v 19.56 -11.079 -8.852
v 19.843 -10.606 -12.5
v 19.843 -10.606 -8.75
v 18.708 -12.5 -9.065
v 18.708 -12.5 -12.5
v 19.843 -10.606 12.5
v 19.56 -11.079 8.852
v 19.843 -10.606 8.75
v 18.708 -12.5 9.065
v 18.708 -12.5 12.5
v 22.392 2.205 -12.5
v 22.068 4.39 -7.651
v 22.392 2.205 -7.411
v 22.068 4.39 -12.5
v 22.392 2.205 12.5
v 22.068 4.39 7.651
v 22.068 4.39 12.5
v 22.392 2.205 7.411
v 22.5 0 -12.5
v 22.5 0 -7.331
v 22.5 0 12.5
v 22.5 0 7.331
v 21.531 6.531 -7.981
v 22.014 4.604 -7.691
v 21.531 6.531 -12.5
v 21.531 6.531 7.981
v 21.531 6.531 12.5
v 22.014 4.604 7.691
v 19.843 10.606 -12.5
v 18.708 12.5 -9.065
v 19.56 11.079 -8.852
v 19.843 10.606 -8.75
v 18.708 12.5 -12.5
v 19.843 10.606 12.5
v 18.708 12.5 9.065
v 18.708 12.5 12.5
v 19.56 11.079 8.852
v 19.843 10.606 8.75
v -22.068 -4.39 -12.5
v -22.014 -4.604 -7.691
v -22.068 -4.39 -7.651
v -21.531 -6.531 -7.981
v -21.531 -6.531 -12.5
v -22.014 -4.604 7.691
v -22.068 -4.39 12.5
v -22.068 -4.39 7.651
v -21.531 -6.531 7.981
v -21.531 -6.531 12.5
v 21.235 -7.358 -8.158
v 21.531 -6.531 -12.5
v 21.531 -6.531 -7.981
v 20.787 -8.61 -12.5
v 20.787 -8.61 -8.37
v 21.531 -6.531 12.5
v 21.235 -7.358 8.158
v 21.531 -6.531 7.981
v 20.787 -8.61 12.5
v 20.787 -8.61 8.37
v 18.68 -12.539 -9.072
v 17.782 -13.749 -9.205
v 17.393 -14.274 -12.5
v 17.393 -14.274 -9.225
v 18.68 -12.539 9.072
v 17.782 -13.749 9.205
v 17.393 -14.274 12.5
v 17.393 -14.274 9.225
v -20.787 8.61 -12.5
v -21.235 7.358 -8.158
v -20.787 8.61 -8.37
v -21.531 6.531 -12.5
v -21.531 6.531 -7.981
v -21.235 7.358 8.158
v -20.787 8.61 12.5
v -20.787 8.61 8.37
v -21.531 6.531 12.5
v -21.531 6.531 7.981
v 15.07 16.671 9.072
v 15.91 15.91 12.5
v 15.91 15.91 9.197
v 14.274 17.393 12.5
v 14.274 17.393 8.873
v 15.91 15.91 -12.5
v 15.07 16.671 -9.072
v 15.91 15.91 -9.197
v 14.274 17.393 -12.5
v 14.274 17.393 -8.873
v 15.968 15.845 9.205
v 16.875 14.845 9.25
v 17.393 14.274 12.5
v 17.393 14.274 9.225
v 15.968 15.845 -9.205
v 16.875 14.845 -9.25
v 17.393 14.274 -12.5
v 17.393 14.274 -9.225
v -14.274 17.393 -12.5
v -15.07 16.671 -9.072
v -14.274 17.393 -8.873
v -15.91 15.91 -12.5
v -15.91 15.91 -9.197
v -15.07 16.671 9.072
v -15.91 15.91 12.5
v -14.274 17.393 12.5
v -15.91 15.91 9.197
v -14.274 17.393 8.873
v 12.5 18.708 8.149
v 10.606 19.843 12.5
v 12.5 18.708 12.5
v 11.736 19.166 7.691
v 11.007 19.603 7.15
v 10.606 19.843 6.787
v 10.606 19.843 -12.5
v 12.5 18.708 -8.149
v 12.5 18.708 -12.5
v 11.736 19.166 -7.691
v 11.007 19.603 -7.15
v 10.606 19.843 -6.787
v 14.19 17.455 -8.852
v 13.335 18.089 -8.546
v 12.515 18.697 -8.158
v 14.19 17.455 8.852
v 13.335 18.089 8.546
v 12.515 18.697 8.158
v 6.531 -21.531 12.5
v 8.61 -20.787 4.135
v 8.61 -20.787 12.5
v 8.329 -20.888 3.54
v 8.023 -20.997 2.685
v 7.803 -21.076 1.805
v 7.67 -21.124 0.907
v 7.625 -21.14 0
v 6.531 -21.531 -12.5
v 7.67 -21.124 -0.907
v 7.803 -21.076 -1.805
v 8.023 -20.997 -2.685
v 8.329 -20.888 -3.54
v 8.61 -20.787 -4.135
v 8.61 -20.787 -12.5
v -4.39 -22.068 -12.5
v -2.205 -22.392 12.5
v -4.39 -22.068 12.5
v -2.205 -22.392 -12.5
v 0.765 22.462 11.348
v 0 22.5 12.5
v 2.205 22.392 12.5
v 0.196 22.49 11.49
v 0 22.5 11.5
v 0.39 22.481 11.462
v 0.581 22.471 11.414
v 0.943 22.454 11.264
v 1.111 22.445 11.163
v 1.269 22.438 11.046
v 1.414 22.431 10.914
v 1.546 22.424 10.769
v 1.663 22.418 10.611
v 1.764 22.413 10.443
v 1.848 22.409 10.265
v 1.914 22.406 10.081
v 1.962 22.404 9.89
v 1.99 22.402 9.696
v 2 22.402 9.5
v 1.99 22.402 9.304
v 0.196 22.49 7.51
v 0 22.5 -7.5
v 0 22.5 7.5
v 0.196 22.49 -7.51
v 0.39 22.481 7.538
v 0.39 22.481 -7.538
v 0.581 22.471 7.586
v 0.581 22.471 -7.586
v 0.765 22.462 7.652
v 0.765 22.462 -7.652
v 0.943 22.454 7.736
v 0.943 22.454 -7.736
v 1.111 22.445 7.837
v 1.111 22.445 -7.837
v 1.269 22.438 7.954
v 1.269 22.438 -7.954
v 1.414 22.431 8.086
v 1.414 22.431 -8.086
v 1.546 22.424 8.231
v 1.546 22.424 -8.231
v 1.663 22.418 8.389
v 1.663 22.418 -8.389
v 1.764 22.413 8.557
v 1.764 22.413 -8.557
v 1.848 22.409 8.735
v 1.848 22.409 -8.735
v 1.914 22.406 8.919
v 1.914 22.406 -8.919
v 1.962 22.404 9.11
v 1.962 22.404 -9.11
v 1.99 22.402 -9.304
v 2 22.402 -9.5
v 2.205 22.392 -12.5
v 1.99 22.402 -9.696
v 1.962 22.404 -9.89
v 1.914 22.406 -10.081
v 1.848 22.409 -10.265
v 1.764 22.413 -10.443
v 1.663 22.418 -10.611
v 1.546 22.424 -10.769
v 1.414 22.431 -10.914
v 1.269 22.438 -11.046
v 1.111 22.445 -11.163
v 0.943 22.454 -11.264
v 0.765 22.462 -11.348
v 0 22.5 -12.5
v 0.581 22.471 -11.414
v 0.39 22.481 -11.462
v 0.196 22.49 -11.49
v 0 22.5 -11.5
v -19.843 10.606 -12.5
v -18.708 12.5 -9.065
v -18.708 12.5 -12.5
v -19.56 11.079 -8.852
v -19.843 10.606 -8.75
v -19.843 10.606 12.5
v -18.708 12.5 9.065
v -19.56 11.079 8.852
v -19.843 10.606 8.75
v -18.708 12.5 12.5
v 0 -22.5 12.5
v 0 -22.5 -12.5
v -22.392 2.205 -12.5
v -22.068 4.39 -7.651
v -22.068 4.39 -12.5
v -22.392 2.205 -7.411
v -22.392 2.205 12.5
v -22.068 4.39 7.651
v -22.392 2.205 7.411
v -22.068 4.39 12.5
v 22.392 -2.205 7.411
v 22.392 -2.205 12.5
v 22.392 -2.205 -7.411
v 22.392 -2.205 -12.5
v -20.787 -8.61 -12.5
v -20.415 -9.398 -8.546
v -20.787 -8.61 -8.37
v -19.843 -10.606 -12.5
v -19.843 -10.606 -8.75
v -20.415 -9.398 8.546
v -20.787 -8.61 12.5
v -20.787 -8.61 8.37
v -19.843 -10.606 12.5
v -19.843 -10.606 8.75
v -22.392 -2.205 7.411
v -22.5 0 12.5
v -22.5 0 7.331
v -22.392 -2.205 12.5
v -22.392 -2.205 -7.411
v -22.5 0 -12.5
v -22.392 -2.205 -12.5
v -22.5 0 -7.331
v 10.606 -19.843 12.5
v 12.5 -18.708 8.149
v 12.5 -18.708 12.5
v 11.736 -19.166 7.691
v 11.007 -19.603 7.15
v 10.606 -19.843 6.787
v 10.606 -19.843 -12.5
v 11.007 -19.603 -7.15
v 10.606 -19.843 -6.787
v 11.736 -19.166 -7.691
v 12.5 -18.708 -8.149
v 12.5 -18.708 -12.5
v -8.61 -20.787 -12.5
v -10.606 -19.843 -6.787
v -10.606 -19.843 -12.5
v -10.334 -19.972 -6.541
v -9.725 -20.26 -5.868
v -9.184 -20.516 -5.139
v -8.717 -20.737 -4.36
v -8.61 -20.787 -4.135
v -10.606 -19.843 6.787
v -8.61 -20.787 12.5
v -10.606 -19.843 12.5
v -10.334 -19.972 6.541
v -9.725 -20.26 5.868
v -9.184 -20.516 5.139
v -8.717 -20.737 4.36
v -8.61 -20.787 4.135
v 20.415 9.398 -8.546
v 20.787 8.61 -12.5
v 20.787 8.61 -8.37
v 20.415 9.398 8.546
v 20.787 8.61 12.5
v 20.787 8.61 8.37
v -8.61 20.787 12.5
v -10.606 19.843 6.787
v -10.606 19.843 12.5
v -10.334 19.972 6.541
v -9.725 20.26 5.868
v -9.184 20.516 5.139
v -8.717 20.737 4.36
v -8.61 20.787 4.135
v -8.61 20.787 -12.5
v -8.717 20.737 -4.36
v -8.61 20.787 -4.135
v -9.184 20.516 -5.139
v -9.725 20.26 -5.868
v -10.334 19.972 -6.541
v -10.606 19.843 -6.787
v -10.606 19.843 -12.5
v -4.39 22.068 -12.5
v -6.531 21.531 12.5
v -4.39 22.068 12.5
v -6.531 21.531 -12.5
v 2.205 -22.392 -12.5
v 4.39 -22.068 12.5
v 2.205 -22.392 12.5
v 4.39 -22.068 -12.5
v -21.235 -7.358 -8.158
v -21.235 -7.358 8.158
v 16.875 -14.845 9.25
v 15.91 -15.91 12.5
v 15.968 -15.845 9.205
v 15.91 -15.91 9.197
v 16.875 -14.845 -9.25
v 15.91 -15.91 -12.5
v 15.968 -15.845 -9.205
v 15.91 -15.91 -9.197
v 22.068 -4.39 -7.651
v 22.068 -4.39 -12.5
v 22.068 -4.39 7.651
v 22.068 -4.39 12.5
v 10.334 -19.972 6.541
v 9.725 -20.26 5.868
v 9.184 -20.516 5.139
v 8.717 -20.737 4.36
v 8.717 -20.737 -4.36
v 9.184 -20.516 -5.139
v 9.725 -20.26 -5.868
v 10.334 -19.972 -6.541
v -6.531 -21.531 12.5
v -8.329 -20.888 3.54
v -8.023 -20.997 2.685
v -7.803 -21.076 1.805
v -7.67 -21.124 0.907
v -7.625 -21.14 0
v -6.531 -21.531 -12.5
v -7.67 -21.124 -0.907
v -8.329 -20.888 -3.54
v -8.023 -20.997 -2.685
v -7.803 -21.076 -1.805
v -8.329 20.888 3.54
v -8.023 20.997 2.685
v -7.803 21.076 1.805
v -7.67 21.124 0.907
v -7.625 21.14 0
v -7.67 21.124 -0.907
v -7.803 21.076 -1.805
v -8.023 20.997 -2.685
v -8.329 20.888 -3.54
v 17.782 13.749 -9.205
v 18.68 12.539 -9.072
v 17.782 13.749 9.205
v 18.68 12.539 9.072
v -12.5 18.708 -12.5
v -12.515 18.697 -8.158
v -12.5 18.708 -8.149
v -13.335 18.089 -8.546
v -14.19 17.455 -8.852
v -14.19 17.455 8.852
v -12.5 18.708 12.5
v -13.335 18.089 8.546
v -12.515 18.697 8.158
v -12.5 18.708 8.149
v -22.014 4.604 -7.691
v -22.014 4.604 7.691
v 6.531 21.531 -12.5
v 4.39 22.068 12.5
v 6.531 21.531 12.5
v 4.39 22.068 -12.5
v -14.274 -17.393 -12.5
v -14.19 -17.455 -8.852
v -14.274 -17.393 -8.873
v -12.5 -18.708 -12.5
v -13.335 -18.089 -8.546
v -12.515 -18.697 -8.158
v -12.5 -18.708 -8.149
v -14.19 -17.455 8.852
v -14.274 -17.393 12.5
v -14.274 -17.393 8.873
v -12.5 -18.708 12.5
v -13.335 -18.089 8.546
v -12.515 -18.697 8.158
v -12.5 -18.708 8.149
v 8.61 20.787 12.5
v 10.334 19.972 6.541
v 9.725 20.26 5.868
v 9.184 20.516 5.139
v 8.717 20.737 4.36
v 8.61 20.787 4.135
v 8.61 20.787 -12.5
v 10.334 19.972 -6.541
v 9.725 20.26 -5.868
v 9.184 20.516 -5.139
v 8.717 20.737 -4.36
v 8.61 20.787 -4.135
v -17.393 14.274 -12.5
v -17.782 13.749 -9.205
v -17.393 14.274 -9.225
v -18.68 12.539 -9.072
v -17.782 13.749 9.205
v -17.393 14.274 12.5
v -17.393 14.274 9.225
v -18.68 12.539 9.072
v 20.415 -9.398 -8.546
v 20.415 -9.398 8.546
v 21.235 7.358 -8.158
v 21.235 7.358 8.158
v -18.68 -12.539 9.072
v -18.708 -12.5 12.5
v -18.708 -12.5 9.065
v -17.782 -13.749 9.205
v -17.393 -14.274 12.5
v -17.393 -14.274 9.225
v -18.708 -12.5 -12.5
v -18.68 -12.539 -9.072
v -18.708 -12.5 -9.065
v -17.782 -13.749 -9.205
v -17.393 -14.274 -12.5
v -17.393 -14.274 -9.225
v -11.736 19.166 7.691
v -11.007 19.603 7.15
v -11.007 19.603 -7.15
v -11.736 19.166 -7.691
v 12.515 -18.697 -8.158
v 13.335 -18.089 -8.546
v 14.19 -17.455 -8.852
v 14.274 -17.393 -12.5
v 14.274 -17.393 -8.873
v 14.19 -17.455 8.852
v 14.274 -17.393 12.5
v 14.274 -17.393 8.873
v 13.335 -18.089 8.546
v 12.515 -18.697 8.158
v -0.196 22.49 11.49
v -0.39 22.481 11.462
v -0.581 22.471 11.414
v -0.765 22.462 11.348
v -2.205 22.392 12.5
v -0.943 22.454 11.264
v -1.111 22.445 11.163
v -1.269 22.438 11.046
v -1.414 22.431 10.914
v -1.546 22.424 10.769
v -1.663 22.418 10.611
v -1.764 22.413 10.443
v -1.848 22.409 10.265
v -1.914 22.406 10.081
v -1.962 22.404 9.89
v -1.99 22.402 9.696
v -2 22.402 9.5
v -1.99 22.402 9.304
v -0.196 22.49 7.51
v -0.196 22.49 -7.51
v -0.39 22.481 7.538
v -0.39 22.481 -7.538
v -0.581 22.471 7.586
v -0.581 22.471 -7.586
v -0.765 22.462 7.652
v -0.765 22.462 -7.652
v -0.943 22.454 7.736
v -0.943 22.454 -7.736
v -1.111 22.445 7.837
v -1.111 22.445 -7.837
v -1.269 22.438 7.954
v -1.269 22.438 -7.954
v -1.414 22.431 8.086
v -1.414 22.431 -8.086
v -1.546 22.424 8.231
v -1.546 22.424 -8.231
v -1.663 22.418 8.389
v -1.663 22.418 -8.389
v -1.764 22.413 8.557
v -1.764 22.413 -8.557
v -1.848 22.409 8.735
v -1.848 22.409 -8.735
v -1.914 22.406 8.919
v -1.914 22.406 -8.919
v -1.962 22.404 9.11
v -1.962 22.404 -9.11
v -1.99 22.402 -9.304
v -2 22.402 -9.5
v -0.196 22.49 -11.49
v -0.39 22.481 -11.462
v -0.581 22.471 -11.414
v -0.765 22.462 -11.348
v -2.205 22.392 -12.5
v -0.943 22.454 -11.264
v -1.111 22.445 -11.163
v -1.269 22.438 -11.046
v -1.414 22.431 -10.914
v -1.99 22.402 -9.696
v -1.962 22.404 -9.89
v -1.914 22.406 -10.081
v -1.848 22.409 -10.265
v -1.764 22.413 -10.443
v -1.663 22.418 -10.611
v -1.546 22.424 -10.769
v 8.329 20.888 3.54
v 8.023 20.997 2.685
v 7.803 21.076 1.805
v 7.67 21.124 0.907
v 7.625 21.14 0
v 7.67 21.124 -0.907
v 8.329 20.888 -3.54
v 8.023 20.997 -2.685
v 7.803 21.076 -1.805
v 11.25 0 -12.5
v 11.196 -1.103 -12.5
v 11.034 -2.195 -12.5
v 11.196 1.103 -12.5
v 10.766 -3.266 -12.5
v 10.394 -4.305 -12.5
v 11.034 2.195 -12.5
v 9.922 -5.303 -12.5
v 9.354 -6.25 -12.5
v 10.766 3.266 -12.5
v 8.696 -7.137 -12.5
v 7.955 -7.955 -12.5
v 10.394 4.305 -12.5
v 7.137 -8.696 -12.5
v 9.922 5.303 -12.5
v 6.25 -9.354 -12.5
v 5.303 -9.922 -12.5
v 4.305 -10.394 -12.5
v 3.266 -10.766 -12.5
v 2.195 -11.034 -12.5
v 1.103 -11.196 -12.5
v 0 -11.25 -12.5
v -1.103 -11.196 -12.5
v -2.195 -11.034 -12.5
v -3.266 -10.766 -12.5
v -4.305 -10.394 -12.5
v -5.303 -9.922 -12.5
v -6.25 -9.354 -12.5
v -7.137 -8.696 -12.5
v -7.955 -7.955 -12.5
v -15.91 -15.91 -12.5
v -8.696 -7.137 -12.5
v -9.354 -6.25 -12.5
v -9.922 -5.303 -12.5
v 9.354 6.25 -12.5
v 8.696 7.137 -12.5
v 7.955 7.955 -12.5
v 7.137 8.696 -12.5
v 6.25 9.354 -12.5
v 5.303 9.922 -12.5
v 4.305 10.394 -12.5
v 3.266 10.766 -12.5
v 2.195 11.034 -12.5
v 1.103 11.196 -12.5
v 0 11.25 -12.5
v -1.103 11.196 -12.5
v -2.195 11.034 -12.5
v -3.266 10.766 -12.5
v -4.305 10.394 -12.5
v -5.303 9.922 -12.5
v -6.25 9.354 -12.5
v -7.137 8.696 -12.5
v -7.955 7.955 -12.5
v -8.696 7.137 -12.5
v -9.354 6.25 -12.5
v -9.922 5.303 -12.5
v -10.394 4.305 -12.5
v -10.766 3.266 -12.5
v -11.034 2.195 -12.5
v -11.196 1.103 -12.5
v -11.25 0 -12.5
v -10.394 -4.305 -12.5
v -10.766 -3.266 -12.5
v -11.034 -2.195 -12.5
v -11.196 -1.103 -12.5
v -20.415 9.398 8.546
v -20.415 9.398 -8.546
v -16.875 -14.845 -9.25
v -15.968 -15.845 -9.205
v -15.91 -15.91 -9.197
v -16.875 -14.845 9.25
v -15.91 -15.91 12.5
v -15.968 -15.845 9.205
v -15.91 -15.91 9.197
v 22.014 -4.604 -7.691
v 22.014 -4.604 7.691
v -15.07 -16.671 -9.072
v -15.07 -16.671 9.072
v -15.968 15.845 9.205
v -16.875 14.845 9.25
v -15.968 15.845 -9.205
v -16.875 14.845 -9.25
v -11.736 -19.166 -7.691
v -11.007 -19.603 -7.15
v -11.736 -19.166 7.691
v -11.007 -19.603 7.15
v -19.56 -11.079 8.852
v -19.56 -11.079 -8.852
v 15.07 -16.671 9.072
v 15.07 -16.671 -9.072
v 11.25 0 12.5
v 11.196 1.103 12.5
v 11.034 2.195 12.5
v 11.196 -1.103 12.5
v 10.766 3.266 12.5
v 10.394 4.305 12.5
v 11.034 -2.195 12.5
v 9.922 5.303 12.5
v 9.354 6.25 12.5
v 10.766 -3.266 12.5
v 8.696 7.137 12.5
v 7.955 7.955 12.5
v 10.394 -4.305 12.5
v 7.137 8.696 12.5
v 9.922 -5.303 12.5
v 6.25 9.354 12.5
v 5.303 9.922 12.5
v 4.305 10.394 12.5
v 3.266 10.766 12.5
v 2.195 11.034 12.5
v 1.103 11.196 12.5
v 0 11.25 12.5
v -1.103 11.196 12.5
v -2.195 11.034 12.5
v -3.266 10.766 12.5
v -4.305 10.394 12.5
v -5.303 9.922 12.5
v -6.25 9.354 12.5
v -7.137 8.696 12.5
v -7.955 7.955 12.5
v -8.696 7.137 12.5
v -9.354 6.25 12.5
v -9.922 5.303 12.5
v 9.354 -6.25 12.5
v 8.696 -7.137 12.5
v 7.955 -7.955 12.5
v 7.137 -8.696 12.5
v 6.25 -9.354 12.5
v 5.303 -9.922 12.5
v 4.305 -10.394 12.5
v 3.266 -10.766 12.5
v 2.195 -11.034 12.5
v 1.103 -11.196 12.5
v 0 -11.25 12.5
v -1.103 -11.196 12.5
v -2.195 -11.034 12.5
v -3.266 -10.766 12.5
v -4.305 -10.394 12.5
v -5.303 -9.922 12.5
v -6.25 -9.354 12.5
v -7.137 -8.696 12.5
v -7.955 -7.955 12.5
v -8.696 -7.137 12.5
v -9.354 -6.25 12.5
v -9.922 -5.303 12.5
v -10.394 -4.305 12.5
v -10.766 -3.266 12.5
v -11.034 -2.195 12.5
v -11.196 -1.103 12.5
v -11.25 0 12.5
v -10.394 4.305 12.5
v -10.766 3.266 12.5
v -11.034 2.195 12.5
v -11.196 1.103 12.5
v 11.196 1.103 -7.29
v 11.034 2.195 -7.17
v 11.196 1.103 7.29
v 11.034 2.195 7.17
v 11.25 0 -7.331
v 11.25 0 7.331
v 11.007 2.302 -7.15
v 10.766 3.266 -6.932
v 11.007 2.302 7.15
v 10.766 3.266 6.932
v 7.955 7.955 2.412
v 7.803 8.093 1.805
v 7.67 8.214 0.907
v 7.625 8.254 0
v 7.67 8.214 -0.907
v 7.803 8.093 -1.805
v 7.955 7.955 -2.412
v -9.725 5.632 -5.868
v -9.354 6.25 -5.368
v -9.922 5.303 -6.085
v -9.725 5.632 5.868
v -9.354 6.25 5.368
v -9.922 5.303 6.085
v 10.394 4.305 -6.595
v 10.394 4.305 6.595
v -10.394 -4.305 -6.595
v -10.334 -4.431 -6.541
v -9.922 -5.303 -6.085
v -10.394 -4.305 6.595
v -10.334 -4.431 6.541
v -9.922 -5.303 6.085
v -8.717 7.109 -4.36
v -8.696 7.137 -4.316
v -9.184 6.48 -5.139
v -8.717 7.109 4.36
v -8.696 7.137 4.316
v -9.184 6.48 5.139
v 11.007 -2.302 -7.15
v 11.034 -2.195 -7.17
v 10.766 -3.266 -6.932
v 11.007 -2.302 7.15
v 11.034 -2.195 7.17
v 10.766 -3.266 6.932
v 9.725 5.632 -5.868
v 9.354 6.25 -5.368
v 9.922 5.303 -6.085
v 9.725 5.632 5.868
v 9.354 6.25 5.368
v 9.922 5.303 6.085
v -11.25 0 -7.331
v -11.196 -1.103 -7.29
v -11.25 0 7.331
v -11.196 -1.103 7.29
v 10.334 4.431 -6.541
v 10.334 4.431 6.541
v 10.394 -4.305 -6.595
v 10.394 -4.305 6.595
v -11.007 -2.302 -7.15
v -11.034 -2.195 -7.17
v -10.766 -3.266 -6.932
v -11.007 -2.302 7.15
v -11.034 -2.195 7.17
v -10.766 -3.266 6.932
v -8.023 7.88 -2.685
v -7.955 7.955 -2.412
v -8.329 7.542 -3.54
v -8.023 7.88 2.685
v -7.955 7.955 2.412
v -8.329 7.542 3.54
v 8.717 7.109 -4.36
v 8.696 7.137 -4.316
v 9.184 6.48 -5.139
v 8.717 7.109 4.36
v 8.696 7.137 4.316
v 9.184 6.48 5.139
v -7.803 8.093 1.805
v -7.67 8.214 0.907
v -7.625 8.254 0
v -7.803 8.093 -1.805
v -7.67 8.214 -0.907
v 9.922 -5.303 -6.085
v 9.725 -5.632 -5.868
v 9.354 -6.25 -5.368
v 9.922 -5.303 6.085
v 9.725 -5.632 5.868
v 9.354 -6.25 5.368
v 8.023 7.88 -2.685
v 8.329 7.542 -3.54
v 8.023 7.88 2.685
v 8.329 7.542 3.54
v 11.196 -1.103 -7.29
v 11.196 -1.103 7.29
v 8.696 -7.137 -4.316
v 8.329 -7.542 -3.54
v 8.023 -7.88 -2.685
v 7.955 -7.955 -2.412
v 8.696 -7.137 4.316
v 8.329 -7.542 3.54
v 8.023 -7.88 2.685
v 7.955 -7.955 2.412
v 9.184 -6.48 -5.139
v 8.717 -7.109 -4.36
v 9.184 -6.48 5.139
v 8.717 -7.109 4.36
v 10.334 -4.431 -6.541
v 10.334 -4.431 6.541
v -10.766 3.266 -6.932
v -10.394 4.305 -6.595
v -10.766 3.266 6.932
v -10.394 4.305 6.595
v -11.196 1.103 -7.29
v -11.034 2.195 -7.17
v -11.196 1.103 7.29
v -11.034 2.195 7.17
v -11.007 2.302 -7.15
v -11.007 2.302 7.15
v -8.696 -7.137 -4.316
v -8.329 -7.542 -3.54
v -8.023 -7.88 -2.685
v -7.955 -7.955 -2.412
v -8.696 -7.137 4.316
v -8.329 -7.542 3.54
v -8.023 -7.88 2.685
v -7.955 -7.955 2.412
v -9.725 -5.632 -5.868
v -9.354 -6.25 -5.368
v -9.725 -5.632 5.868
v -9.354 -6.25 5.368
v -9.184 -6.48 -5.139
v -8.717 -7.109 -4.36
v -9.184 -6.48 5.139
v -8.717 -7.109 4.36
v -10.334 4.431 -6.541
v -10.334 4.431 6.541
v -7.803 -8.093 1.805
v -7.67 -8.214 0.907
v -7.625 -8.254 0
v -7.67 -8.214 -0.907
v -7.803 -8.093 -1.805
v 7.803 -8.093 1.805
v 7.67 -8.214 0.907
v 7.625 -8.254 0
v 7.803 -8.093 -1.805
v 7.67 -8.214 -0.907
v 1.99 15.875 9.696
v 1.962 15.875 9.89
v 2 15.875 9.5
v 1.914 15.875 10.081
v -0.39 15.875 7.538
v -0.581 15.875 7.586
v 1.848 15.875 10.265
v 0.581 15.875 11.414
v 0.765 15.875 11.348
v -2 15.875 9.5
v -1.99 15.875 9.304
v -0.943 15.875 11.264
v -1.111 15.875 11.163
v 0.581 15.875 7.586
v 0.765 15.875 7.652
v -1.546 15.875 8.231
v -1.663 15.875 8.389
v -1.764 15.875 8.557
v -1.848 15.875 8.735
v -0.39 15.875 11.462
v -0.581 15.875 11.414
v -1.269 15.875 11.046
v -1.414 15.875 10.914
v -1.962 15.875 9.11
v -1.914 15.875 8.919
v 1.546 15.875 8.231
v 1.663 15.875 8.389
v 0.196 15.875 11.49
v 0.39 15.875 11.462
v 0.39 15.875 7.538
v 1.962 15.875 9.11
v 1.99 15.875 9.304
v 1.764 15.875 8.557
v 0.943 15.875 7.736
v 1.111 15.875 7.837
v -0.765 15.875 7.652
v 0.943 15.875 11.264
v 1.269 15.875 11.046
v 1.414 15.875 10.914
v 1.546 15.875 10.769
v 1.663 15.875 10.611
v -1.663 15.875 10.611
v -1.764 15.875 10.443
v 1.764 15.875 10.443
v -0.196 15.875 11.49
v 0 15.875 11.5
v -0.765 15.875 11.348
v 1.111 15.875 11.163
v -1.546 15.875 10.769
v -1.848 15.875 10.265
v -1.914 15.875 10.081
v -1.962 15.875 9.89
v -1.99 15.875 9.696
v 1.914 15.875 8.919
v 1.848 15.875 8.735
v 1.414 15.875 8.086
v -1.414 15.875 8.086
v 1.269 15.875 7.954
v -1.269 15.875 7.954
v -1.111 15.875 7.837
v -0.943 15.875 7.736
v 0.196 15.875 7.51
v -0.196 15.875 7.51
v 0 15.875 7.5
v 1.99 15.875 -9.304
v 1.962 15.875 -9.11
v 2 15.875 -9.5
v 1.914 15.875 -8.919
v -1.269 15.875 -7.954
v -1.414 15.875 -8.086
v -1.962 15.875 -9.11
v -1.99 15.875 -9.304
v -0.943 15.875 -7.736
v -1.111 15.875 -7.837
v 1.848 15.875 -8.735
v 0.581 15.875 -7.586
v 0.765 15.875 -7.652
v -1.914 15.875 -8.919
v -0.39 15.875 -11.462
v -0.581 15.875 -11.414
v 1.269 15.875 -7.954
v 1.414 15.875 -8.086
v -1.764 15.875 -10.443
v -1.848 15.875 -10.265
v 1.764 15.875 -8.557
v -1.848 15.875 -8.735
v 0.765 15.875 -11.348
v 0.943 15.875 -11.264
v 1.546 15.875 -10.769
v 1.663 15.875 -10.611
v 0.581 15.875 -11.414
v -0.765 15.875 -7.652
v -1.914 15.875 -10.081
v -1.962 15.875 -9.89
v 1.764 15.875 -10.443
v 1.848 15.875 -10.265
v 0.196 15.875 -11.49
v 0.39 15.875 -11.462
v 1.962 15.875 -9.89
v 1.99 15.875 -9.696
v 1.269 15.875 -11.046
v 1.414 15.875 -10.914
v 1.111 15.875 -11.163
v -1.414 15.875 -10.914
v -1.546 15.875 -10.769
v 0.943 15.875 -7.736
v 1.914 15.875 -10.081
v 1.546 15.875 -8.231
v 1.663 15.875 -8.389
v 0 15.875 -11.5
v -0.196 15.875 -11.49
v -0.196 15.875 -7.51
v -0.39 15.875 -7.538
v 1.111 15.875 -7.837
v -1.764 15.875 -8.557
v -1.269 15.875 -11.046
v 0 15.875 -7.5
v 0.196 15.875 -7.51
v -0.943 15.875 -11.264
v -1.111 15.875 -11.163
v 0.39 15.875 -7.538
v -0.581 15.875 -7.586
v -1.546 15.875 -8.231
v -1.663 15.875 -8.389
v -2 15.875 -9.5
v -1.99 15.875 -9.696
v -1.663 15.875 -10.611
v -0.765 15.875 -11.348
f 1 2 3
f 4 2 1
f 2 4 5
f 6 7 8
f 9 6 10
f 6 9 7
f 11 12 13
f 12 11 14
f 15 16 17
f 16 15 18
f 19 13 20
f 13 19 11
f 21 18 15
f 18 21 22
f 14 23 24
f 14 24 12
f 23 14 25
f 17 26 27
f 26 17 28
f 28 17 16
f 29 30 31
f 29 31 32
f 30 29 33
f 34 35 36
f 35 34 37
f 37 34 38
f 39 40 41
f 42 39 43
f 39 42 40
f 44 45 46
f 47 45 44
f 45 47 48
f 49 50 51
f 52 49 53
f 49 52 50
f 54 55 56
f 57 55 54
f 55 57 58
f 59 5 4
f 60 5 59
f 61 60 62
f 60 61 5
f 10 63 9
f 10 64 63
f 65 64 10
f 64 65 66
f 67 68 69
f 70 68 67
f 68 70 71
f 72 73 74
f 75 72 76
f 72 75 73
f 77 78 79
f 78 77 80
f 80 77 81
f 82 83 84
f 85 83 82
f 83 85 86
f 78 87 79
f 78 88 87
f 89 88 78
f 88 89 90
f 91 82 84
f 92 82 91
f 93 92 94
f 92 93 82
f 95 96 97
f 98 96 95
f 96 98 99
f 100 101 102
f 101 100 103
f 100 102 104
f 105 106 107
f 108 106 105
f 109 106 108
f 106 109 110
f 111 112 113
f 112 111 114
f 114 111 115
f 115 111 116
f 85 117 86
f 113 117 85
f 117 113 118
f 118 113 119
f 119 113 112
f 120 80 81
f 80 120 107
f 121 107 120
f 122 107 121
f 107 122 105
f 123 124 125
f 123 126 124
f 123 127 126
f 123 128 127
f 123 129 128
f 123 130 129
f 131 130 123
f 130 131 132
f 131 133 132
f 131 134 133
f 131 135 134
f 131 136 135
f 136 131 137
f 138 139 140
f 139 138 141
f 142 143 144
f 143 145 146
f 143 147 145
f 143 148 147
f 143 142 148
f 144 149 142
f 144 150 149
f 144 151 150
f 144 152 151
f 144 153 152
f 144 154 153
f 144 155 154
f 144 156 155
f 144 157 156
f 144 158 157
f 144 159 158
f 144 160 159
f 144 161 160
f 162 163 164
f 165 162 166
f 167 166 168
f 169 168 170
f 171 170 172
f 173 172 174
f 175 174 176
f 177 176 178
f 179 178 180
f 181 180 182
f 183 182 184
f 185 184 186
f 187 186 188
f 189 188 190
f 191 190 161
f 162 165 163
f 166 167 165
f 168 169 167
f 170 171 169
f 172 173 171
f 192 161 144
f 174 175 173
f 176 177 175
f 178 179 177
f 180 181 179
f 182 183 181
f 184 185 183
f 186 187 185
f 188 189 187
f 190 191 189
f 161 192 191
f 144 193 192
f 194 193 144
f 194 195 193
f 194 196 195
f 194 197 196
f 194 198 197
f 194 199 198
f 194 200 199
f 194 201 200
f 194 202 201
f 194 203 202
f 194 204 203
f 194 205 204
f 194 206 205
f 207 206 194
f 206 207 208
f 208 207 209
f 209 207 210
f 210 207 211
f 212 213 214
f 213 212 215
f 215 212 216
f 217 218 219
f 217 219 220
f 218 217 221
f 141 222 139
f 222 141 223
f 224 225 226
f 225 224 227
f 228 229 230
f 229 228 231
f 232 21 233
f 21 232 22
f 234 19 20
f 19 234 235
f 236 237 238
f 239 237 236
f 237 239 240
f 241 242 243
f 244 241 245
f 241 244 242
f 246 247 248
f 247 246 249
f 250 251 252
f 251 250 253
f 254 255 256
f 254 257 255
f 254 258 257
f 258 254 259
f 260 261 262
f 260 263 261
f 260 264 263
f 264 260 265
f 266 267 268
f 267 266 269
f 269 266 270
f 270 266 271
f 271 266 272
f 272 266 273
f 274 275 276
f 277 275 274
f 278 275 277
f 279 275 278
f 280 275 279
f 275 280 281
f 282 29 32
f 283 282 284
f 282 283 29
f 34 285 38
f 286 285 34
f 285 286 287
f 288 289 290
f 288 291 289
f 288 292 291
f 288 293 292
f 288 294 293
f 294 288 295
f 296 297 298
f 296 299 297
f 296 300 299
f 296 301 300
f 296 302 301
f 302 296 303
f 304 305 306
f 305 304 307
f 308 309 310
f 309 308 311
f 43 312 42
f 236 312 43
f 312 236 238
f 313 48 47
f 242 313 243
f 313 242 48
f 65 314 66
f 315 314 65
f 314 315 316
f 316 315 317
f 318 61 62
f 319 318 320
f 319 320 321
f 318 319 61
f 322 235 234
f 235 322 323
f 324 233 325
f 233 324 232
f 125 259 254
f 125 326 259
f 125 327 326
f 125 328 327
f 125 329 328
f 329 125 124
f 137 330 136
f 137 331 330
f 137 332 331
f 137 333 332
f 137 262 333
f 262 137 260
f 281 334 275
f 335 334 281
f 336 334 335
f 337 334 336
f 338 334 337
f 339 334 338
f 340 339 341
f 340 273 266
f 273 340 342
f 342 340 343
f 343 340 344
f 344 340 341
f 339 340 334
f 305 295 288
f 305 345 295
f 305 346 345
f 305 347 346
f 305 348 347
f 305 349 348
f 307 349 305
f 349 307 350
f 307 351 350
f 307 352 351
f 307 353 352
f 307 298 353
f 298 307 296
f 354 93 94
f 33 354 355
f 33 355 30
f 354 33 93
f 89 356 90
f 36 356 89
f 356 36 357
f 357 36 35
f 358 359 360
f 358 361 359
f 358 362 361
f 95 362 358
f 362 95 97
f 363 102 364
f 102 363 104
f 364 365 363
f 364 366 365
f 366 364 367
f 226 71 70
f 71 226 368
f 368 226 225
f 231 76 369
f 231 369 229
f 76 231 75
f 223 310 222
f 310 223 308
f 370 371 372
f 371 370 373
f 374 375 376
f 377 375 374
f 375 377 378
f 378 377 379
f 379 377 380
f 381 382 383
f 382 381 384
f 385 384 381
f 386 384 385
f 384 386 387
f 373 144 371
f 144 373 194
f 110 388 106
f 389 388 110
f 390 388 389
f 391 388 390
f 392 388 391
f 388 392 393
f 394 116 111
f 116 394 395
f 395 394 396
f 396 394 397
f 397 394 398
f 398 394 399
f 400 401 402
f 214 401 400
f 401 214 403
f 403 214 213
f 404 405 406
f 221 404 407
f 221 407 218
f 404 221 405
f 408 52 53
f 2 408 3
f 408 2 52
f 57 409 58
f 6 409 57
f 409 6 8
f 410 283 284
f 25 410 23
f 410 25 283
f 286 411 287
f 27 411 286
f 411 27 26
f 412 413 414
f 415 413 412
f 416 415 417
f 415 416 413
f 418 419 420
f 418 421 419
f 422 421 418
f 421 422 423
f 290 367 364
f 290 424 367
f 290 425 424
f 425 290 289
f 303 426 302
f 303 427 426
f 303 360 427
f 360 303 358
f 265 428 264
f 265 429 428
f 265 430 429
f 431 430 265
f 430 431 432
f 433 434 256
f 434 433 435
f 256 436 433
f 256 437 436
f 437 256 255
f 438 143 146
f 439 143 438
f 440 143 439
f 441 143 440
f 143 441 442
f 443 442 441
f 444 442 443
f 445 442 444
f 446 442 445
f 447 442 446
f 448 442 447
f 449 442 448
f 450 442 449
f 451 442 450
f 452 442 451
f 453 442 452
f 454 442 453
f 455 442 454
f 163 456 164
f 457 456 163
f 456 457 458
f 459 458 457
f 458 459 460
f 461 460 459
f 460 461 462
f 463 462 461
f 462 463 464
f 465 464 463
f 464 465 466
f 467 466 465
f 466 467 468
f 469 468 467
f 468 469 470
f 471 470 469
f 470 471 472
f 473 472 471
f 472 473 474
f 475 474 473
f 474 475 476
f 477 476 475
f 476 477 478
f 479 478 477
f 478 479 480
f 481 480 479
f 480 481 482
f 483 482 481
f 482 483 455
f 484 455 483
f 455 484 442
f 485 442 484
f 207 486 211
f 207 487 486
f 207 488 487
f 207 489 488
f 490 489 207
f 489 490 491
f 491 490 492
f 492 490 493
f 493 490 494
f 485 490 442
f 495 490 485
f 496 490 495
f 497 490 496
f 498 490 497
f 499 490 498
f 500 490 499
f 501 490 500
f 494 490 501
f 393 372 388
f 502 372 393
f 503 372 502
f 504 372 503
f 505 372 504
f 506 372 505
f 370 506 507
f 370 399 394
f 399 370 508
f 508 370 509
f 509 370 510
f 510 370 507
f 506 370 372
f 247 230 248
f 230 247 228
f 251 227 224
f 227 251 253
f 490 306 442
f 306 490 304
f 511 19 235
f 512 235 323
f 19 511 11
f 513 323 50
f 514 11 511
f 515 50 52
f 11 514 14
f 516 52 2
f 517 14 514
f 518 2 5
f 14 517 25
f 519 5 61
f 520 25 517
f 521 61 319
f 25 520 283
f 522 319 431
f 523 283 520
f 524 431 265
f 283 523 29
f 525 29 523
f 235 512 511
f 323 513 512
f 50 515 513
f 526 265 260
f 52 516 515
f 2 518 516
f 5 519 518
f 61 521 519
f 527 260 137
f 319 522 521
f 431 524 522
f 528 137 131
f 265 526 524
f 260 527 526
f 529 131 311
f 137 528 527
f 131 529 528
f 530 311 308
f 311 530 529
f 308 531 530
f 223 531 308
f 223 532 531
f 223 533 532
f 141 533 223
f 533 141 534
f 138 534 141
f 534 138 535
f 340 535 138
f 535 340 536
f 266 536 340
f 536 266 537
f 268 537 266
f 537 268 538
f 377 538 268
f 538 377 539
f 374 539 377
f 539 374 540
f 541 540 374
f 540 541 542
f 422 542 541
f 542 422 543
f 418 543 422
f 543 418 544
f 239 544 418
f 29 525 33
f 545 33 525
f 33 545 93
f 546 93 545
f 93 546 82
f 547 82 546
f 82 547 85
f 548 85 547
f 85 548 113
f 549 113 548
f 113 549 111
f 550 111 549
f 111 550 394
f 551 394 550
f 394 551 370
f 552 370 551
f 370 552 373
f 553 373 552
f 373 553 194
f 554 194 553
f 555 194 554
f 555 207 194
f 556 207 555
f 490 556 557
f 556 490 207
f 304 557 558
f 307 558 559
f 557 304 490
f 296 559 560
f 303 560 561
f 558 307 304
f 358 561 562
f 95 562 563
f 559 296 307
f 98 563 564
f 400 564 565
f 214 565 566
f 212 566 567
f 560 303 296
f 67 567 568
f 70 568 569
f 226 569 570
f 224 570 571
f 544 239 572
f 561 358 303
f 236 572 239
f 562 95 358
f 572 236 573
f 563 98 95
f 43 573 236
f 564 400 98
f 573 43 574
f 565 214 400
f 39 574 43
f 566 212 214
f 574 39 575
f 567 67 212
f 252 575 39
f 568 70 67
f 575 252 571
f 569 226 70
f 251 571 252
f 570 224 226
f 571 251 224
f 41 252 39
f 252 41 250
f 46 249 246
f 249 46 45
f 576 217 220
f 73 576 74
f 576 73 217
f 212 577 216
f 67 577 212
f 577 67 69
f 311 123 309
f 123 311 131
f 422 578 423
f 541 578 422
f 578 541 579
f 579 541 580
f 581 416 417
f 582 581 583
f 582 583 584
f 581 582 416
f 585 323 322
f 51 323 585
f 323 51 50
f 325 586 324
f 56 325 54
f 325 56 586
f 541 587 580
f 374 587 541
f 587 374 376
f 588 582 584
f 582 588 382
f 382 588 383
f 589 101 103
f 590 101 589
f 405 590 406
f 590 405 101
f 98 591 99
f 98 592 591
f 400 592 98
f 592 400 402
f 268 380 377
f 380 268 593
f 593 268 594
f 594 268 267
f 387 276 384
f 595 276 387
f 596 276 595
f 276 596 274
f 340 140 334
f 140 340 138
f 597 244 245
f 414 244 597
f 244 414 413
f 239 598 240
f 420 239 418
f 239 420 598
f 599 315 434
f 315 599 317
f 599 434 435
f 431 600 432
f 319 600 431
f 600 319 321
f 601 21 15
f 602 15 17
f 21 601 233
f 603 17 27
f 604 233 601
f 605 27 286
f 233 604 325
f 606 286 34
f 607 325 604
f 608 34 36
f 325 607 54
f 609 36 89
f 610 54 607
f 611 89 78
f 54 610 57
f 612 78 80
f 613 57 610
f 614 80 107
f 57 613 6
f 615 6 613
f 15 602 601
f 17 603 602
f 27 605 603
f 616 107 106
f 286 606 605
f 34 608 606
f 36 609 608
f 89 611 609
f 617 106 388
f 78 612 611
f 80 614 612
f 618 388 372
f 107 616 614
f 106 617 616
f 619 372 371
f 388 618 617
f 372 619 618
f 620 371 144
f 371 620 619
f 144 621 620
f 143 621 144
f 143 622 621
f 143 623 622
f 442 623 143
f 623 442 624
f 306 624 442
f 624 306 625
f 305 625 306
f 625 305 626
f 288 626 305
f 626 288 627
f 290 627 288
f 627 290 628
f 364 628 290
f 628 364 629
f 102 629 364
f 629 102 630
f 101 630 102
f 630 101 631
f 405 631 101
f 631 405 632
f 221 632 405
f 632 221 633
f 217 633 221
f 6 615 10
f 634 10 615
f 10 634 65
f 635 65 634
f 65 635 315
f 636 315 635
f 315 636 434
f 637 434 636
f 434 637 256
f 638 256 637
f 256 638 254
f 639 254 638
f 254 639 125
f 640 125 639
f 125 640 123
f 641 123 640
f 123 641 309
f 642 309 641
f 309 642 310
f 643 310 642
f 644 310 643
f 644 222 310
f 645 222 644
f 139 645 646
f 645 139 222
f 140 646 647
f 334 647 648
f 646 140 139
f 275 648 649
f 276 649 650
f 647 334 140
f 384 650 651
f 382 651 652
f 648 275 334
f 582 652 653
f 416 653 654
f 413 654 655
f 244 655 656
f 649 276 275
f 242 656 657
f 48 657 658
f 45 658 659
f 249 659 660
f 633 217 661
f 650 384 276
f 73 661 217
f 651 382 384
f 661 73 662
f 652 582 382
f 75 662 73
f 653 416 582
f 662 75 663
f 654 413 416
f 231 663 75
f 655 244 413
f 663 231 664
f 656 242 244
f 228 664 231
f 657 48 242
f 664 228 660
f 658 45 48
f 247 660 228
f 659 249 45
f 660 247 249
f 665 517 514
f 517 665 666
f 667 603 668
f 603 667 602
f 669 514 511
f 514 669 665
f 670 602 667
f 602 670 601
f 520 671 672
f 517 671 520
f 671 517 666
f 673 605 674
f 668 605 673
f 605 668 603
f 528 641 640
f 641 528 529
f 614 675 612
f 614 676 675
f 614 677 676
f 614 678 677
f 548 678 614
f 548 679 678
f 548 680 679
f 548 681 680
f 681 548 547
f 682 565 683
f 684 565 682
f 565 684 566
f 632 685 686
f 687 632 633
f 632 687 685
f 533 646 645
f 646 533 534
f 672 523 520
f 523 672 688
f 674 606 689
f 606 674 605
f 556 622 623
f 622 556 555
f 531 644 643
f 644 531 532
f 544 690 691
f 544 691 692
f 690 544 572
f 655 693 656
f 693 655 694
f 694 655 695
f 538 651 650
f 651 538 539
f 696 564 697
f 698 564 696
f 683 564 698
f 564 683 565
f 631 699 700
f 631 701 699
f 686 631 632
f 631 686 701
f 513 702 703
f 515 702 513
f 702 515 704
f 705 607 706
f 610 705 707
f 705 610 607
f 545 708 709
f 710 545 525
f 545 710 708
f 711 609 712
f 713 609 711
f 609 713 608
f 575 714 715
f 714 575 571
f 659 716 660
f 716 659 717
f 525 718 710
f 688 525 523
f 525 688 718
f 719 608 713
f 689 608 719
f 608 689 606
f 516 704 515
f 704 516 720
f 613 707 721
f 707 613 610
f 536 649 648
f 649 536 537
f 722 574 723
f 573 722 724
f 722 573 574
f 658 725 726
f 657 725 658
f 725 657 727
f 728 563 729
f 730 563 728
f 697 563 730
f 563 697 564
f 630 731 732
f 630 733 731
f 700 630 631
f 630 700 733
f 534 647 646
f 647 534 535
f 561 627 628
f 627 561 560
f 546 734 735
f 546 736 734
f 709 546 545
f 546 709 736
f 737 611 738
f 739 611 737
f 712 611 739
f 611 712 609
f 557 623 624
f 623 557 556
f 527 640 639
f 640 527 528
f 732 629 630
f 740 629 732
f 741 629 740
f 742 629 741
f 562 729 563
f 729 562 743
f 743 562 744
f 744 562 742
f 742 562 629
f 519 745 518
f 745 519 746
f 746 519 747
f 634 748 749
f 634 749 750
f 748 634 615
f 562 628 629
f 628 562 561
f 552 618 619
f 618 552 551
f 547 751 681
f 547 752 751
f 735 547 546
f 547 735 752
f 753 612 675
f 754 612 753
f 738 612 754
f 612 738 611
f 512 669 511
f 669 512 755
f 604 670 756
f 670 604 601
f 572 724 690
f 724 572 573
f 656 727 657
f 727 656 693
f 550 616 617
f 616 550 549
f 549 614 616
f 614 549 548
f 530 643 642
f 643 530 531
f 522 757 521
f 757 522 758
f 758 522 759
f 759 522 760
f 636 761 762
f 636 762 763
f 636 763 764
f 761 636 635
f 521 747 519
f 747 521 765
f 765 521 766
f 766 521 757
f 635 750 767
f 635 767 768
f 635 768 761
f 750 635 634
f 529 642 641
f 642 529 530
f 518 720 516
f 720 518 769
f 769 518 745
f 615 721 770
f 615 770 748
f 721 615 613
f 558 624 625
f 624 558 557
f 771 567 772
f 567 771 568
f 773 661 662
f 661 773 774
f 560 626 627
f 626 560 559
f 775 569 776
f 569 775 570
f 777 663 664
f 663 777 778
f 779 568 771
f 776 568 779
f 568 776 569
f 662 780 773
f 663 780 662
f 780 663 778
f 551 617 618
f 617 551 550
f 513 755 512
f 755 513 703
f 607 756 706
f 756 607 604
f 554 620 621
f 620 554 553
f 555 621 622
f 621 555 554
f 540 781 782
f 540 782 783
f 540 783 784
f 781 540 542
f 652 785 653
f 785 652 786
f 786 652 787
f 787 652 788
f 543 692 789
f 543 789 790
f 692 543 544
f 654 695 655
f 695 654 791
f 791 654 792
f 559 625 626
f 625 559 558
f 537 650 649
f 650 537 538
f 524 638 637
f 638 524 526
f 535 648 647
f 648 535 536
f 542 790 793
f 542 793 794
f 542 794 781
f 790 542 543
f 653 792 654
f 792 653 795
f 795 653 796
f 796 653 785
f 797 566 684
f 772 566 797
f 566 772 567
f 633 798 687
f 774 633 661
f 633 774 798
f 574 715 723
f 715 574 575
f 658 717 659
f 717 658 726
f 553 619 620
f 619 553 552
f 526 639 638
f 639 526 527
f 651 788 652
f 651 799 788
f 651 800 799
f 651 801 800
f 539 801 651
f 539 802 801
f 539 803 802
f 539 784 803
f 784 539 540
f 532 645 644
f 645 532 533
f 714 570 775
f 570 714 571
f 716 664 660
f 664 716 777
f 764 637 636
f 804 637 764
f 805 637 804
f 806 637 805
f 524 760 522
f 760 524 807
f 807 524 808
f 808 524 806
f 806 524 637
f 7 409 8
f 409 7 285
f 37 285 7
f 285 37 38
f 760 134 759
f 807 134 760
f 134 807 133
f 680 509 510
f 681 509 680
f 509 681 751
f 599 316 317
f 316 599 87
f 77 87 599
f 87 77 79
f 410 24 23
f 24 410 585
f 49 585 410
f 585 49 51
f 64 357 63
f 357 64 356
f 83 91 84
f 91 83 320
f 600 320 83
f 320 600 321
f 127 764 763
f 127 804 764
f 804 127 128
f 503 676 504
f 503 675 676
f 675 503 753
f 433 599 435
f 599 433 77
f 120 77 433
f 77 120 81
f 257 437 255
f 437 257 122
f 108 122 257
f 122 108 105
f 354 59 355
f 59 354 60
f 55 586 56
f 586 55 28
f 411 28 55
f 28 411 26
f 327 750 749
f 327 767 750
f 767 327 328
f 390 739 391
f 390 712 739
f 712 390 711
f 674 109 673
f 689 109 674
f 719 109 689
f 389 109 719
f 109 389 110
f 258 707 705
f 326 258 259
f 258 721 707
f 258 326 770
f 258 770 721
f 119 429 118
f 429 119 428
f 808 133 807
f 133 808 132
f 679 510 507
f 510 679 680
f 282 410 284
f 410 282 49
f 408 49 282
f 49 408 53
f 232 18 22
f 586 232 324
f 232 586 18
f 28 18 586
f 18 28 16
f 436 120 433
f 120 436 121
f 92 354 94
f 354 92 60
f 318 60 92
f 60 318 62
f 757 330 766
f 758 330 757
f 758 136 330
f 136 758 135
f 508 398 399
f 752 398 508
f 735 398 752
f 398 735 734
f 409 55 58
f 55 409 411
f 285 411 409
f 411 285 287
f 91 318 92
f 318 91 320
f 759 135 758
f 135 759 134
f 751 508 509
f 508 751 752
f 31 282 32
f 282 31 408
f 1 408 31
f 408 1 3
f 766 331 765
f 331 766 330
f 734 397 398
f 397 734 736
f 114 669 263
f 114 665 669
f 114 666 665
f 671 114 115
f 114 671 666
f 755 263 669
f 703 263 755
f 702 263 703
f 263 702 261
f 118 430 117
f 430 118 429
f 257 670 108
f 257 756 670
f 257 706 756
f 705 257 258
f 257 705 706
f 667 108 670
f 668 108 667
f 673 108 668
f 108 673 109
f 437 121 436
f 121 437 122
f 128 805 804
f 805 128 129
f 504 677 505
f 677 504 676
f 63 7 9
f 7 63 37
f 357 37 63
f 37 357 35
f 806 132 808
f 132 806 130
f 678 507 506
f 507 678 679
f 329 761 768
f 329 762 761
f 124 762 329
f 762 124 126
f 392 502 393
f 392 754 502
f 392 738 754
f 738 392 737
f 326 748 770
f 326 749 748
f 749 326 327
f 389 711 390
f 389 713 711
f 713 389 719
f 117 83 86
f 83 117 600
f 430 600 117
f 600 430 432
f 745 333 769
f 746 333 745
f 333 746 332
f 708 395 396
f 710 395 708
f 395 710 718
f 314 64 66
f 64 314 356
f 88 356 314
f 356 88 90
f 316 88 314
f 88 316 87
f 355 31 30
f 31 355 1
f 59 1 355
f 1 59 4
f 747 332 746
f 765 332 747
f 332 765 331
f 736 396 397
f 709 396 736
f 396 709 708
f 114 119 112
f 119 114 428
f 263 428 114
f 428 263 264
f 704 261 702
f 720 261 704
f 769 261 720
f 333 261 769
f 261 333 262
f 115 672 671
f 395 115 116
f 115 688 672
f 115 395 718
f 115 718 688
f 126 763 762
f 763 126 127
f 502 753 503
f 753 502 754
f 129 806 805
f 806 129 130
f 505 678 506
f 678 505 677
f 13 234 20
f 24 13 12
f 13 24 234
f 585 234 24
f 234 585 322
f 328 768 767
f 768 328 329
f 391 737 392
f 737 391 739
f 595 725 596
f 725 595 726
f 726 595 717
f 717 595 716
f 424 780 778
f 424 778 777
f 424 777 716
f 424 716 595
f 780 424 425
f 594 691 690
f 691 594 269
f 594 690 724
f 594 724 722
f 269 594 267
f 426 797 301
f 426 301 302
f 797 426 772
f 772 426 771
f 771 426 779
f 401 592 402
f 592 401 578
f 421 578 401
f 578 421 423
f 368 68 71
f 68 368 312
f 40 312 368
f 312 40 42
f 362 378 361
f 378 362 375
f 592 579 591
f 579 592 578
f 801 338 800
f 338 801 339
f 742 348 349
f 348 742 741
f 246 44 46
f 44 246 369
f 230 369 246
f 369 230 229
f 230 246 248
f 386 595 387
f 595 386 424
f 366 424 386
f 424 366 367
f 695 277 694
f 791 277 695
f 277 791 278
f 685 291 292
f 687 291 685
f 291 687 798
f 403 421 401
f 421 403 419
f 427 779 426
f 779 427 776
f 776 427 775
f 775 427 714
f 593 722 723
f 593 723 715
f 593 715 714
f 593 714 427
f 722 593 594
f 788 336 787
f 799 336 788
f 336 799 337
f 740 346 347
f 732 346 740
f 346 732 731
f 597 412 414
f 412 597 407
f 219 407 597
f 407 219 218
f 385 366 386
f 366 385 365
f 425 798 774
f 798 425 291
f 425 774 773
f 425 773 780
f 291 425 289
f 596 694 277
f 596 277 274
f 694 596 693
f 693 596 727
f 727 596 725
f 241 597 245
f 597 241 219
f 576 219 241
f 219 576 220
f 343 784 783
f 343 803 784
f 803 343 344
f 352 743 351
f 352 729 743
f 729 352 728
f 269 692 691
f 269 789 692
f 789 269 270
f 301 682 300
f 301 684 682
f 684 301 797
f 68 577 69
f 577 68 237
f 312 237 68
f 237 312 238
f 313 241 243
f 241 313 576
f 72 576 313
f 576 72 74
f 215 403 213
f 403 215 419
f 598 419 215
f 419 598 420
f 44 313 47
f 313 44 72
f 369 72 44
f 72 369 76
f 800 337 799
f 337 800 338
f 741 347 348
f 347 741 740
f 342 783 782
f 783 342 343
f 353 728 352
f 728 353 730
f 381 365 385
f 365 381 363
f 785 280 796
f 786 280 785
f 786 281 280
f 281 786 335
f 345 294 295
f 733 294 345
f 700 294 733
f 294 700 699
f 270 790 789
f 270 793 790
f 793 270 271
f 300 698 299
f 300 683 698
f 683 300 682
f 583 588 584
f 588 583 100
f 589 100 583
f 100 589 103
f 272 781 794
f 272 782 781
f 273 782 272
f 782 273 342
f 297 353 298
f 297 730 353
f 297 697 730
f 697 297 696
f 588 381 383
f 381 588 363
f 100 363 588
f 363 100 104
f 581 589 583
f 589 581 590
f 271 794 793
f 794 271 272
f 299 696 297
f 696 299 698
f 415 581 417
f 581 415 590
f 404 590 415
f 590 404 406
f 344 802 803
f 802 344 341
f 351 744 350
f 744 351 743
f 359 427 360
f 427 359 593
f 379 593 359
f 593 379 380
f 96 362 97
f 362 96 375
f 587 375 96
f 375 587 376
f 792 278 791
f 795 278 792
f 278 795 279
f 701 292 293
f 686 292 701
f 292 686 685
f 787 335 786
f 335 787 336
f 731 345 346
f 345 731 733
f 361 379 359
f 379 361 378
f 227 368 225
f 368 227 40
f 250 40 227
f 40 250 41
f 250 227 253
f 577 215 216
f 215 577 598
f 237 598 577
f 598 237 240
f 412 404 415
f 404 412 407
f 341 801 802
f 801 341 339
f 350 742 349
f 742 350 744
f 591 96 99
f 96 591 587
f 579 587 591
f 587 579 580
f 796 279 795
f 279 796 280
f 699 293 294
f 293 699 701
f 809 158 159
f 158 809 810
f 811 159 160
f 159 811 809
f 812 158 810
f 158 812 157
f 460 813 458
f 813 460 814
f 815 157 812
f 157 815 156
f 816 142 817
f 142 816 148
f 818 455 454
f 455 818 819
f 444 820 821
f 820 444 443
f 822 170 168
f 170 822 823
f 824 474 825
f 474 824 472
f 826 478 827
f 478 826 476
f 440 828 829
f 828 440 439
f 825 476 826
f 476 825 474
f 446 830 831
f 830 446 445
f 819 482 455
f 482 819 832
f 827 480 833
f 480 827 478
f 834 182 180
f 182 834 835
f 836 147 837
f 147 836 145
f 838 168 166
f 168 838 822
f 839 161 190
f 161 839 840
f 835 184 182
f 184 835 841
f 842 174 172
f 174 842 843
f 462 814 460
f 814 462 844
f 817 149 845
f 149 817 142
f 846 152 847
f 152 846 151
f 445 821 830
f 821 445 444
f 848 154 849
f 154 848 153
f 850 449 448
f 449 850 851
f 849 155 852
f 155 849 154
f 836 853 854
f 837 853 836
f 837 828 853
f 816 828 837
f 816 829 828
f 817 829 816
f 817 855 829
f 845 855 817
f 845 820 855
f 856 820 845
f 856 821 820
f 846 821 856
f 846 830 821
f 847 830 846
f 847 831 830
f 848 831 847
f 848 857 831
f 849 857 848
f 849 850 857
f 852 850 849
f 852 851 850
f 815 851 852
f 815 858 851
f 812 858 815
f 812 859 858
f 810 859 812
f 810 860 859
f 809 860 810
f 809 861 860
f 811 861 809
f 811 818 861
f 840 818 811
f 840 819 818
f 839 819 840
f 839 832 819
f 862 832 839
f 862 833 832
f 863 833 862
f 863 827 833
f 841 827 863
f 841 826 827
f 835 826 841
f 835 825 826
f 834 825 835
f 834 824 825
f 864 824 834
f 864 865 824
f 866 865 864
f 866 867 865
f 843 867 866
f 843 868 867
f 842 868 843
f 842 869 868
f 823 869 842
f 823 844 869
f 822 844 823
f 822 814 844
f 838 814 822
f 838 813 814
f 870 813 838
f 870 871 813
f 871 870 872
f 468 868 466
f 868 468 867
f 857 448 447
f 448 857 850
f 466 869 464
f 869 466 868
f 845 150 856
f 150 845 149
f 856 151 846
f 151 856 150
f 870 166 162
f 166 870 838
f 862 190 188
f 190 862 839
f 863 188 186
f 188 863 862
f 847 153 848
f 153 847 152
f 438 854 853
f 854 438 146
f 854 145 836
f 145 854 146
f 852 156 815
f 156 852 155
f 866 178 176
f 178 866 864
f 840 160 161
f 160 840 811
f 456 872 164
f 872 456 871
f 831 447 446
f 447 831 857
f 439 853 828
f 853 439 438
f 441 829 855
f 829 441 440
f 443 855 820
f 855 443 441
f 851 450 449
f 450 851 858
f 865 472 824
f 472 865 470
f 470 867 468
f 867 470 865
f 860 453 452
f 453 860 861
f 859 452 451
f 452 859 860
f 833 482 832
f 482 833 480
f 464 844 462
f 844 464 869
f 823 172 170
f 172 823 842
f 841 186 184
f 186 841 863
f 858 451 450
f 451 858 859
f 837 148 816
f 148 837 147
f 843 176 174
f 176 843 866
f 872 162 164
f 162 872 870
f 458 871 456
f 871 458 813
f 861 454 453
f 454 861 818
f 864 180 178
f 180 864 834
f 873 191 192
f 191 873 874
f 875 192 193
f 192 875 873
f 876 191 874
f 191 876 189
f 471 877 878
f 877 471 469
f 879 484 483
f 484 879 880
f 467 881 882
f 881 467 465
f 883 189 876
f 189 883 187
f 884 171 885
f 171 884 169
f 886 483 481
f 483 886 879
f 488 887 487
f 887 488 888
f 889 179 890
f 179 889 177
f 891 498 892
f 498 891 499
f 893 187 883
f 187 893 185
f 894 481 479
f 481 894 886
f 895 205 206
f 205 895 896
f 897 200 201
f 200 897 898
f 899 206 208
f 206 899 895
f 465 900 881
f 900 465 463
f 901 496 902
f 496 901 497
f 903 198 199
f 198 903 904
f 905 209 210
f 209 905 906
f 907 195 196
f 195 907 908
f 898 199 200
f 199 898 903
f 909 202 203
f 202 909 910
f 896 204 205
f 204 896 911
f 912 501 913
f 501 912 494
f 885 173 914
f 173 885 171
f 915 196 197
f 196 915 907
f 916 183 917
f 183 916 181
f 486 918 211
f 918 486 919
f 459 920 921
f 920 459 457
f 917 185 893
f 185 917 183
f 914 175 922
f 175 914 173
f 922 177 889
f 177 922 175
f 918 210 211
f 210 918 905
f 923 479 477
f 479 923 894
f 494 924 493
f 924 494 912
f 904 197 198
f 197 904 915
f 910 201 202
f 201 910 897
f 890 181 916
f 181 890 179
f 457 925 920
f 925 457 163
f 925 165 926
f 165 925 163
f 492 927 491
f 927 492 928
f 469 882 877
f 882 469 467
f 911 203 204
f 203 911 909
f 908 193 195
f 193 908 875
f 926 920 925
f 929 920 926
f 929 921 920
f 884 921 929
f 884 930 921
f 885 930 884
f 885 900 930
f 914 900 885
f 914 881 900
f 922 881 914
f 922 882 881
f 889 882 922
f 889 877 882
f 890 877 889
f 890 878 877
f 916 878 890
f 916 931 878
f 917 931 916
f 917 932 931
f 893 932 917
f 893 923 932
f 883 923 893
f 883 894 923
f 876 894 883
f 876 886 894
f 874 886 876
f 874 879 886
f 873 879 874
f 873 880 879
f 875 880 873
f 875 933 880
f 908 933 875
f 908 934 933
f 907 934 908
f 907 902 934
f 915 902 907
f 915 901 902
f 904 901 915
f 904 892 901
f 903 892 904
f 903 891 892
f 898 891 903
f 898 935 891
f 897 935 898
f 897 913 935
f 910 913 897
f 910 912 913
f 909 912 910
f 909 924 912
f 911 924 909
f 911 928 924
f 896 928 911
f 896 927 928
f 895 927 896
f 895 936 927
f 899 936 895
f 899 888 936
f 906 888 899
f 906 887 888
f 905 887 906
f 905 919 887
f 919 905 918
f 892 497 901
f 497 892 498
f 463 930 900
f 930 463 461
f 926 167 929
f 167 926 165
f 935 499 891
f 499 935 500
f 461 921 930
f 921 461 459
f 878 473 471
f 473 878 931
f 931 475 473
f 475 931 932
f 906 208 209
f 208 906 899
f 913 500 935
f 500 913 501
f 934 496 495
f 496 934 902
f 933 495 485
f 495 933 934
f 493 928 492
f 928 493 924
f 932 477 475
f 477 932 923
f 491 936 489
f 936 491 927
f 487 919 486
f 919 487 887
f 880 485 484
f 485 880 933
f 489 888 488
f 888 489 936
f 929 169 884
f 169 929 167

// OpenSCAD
// COBRA Vertebra - L5 V23
// Height: 25.0mm, OD: 45.0mm

$fn = 64;

difference() {
    // Outer cylinder
    cylinder(h=25.0, d=45.0, center=true);
    
    // Inner channel
    cylinder(h=27.0, d=22.5, center=true);

    // Battery cavity 1
    rotate([0, 0, 0])
    translate([16.875, 0, 0])
    rotate([90, 0, 0])
    cylinder(h=74.0, d=18.5, center=true);

    // Battery cavity 2
    rotate([0, 0, 180])
    translate([16.875, 0, 0])
    rotate([90, 0, 0])
    cylinder(h=74.0, d=18.5, center=true);

    // Pivot holes
    translate([0, 22.5, 9.5])
    rotate([90, 0, 0])
    cylinder(h=13.25, d=4, center=true);
    
    translate([0, 22.5, -9.5])
    rotate([90, 0, 0])
    cylinder(h=13.25, d=4, center=true);
}
